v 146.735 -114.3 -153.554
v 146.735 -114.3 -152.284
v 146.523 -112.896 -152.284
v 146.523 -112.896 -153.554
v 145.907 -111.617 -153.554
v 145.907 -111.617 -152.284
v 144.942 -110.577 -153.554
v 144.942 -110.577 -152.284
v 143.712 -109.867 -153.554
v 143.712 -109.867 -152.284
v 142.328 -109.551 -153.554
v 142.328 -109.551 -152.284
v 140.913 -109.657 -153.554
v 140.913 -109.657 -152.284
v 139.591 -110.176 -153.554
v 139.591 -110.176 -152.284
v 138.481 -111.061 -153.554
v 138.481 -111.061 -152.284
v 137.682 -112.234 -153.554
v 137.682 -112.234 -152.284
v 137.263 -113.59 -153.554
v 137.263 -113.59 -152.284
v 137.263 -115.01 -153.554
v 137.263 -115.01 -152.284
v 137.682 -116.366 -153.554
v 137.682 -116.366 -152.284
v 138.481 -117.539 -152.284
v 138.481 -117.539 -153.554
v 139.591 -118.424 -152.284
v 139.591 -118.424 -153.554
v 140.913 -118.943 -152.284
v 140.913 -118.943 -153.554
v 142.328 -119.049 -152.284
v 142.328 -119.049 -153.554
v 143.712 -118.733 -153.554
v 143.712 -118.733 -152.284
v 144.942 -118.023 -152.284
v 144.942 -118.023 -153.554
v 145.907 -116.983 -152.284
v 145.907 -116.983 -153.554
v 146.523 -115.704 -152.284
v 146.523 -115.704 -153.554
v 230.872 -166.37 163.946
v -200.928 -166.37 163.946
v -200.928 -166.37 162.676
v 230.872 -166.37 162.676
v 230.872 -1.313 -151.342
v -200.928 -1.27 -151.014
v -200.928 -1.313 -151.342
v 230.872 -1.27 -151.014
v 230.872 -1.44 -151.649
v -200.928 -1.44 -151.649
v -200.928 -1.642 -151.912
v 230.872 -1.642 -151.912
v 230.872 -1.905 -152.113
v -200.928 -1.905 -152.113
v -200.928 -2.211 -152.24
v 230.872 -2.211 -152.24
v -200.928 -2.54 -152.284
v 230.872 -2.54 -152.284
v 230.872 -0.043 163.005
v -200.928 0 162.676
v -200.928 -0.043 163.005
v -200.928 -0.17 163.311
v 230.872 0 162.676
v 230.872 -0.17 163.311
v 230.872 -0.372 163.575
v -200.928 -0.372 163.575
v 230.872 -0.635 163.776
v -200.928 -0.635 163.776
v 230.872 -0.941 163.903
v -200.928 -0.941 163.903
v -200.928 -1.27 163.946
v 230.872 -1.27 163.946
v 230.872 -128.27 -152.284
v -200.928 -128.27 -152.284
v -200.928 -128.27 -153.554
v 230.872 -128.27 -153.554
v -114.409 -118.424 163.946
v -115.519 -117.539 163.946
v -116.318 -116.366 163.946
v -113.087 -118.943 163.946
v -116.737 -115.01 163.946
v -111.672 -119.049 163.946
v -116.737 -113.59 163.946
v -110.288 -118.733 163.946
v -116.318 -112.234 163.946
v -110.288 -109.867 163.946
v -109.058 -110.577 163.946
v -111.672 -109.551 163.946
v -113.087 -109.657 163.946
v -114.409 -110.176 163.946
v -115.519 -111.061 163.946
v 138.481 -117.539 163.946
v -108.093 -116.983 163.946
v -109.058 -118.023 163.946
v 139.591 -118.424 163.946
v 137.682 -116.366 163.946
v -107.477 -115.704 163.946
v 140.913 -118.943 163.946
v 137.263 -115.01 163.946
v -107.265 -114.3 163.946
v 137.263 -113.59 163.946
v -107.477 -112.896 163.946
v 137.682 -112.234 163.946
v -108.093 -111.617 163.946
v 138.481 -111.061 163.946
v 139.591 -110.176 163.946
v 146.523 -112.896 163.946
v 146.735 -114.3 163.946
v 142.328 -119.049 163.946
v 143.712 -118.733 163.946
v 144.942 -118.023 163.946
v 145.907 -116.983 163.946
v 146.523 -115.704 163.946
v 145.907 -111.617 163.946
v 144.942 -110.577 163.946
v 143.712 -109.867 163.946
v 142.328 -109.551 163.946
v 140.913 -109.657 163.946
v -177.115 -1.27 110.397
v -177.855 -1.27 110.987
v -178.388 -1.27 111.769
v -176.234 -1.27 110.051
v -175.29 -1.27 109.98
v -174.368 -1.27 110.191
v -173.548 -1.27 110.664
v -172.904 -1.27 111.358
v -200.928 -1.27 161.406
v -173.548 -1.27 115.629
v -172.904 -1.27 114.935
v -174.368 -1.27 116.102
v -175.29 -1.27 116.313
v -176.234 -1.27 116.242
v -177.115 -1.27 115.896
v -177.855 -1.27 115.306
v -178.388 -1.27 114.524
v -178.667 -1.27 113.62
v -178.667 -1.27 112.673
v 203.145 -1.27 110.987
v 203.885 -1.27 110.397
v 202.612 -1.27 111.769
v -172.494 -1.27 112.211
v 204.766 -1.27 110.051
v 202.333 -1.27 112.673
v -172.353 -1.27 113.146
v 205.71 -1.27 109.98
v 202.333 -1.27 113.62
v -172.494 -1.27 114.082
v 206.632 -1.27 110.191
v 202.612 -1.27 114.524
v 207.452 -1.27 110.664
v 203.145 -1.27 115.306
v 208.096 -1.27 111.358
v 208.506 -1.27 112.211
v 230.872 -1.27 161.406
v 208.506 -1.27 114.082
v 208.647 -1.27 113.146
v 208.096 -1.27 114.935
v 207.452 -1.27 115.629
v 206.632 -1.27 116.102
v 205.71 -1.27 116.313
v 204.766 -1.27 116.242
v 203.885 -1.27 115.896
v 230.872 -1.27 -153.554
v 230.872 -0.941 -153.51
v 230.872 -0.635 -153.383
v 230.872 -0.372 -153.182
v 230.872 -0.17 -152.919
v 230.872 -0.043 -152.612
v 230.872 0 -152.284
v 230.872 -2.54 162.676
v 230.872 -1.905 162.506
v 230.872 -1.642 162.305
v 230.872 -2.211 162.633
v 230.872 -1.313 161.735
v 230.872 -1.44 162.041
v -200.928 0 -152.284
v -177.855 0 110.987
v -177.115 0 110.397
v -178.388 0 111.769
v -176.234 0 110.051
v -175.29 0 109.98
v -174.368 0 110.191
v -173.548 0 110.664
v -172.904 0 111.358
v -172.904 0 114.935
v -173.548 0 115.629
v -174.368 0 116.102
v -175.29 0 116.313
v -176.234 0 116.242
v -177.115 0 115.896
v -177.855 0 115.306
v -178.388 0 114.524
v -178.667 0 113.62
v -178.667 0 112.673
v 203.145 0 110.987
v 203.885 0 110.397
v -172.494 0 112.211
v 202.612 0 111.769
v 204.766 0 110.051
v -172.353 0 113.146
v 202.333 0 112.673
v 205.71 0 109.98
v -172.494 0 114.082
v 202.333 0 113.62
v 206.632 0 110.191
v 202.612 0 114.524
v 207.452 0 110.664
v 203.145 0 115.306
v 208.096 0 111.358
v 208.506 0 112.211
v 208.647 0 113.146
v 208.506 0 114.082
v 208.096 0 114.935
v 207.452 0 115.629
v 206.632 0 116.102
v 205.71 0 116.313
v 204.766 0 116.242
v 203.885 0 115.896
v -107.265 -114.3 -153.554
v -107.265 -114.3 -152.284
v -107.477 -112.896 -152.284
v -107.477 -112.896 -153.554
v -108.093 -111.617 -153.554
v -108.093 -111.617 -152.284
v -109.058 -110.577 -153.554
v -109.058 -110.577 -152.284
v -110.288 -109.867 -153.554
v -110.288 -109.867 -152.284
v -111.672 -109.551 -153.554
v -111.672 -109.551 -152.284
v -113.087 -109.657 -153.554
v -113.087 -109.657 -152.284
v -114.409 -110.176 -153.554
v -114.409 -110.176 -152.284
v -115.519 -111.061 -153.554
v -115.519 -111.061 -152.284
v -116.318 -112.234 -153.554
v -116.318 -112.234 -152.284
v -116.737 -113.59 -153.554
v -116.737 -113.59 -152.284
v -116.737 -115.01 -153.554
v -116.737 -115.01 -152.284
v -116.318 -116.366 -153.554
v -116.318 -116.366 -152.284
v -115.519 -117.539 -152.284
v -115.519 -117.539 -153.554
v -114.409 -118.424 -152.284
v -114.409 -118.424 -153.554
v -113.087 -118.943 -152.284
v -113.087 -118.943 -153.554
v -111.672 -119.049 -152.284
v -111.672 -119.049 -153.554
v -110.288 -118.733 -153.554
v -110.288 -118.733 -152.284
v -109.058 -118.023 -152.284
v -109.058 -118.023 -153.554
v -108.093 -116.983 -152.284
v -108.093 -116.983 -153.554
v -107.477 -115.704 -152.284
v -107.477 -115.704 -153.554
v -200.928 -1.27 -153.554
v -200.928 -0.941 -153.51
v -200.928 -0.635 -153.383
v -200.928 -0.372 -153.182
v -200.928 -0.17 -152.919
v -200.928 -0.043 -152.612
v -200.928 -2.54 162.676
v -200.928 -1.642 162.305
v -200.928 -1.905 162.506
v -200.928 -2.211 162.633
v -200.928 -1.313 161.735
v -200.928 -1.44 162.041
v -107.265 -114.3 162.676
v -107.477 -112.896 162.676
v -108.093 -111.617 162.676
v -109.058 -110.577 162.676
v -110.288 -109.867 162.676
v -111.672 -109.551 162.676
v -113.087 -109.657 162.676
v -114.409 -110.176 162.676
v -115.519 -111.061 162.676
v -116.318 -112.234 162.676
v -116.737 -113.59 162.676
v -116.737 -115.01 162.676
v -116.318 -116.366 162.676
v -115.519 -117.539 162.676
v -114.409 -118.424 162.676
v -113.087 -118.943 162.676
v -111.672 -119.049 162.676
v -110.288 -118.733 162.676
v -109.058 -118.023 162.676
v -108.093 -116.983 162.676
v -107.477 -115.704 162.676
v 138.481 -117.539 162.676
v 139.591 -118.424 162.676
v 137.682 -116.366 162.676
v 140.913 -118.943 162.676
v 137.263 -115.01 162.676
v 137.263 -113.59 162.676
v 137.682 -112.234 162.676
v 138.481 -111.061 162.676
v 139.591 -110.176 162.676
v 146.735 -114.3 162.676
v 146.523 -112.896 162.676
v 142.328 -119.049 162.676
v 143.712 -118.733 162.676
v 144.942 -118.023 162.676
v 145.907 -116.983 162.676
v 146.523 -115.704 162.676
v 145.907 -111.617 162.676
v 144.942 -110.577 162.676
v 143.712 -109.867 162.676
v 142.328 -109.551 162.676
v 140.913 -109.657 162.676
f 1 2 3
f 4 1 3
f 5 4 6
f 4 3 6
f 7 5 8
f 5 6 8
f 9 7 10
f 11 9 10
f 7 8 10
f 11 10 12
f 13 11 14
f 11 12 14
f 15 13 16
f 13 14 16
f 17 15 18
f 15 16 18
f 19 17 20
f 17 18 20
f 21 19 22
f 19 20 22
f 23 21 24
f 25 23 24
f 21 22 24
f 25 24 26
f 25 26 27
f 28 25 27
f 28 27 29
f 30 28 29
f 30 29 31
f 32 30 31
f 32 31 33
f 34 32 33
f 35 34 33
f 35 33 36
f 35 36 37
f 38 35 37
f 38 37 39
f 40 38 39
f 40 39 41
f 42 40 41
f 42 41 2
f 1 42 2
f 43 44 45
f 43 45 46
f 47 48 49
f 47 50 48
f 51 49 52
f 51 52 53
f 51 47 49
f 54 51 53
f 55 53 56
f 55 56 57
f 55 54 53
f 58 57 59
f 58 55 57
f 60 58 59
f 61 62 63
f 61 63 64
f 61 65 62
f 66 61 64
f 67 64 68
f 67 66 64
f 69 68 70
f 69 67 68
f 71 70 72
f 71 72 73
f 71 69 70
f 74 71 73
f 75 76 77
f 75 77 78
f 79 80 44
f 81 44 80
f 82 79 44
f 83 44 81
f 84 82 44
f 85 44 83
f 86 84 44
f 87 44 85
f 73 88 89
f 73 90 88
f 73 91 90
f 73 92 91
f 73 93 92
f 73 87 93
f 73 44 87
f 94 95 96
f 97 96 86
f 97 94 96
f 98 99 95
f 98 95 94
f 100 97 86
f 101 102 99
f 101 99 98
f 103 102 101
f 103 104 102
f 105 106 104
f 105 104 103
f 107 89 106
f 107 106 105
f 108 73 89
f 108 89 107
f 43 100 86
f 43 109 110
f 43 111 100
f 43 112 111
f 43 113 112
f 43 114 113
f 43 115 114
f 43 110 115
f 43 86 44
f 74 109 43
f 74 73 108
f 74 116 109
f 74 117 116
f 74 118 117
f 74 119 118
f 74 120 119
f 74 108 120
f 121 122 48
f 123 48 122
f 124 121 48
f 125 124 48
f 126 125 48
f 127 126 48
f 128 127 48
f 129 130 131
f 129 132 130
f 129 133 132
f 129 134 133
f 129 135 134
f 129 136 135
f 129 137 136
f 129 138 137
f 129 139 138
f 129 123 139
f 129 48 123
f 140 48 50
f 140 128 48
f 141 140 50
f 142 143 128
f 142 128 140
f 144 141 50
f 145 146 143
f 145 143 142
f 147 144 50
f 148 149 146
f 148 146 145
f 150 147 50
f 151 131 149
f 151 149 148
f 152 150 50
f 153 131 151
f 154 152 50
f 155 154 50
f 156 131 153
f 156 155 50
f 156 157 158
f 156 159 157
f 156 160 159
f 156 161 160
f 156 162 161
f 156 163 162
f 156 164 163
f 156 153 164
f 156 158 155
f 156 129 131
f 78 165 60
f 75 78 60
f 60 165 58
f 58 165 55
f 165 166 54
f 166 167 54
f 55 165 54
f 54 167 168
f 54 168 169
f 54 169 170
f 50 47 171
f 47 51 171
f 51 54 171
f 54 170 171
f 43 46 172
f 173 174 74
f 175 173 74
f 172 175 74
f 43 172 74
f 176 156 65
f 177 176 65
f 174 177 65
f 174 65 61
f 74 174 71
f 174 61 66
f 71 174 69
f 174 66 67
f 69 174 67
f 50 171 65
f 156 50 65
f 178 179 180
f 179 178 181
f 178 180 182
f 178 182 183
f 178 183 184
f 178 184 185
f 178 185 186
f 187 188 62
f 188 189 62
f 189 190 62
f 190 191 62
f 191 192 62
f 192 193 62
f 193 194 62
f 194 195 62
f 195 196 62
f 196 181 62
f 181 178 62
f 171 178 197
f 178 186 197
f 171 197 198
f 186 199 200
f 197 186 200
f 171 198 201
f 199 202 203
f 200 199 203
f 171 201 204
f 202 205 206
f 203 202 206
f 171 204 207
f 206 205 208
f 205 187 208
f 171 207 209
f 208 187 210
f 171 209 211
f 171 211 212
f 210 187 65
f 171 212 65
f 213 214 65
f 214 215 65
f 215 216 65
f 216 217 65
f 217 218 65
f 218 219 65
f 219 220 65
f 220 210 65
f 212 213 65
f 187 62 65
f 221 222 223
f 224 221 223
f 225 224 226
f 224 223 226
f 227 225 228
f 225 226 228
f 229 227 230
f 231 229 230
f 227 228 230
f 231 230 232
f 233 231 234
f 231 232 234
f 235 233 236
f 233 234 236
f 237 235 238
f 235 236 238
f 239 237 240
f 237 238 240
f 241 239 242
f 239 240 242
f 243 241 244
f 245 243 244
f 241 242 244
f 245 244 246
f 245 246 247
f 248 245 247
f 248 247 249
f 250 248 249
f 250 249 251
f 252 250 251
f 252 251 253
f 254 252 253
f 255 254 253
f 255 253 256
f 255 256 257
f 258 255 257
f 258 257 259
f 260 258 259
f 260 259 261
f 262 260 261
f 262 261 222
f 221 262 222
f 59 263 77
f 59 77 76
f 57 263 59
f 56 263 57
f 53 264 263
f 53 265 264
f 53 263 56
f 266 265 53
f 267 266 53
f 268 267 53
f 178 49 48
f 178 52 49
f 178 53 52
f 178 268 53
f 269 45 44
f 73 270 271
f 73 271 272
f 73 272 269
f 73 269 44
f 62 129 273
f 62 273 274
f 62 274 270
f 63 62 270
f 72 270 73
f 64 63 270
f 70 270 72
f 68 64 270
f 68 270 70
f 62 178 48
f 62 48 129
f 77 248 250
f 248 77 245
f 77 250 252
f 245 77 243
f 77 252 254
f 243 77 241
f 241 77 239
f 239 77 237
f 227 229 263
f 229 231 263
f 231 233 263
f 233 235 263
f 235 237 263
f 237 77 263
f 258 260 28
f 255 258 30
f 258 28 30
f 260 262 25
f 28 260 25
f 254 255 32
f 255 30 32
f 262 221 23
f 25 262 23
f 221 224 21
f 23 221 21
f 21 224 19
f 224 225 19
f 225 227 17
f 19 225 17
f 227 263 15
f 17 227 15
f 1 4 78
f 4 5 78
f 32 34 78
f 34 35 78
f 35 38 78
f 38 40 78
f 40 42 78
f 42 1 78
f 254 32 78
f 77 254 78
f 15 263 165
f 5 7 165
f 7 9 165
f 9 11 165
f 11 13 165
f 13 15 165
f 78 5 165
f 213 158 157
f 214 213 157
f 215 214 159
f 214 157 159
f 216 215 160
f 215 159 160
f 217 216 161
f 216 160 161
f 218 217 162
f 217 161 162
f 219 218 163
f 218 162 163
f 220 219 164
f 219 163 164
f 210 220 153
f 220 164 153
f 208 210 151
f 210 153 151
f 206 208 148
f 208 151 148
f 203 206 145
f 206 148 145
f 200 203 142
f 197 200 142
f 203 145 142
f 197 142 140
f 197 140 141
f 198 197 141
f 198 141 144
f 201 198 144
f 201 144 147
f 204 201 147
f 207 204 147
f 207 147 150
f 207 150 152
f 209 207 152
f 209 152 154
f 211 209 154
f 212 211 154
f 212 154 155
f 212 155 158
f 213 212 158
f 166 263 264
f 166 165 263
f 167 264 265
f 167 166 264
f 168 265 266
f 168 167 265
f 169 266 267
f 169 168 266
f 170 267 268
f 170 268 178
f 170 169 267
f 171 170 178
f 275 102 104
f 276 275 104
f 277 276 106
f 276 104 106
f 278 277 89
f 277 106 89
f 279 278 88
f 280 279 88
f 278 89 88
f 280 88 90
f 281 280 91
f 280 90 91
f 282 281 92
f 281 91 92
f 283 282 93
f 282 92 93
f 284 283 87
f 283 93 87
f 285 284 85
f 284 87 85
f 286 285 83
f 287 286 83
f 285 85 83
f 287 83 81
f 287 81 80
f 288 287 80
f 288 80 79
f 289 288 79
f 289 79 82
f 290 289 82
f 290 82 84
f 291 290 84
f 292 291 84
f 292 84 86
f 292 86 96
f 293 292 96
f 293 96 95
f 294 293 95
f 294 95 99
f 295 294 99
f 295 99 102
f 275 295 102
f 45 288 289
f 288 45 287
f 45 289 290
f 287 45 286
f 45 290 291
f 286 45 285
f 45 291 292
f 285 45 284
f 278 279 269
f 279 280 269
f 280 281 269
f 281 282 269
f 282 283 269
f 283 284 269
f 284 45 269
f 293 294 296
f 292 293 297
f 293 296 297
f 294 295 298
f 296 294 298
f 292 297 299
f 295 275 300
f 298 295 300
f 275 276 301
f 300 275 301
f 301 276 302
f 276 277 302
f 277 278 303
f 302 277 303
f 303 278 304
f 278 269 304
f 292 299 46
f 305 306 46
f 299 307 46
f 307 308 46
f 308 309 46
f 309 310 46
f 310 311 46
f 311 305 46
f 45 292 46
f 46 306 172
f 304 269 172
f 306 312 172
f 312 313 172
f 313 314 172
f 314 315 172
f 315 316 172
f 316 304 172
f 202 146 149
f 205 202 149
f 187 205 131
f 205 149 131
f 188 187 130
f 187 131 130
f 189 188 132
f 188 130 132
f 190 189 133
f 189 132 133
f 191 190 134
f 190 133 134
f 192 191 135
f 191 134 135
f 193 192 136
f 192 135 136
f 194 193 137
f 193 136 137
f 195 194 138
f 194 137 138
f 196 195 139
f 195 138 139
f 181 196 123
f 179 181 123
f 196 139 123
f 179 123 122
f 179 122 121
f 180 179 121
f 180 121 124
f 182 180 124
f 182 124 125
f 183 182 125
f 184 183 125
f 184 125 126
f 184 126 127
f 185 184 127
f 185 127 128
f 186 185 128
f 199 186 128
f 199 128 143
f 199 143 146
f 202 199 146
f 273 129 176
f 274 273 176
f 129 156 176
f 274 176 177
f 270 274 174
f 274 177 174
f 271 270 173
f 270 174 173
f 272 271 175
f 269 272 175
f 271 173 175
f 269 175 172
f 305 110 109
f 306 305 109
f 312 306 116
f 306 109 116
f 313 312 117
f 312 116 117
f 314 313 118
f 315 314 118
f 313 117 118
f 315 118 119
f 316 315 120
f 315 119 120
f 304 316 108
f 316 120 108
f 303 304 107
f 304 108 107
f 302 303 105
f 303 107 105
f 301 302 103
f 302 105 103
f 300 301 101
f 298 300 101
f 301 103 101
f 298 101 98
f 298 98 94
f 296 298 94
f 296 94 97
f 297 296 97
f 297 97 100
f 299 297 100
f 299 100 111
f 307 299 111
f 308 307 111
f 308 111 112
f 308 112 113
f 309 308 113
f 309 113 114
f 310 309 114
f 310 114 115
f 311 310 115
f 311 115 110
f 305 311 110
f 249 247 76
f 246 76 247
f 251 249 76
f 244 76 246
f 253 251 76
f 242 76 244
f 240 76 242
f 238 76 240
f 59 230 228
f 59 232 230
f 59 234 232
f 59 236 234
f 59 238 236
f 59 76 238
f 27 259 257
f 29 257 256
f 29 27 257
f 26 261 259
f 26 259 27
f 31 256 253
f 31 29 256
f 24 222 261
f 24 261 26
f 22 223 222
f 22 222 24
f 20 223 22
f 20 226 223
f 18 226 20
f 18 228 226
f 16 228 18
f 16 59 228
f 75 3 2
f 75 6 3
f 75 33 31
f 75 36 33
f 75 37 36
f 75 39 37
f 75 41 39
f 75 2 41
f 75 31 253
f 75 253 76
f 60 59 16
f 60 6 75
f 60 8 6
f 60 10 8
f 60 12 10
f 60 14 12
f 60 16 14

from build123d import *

# Parameters (mm, degrees)
F0_W      = 431.8
F0_H      = 317.5
F1_DEPTH  = 1.27
F2_W      = 431.8
F2_H      = 1.27
F3_DEPTH  = 165.1
F4_R      = 1.27
F5_W      = 431.8
F5_H      = 1.27
F6_DEPTH  = 127
F7_R      = 1.27
F8_R      = 3.175
F9_DEPTH  = 25.4
F10_R     = 4.7625
F11_DEPTH = 317.501


with BuildPart() as f1:
    # F0 (on Front) → F1 (new body)
    with BuildSketch(Plane.XZ):
        with Locations((14.972474, 5.196487)):
            Rectangle(F0_W, F0_H)
    extrude(amount=F1_DEPTH)

    # F2 (on face) → F3 (join)
    with BuildSketch(Plane.XZ.offset(1.27)):
        with Locations((14.972474, 163.311487)):
            Rectangle(F2_W, F2_H)
    extrude(amount=F3_DEPTH)

    # F4
    f4_edges = [f1.edges().sort_by_distance(p)[0] for p in [
        (14.972474, -1.27, 162.676487),
        (14.972474, 0, 163.946487),
    ]]
    fillet(f4_edges, radius=F4_R)

    # F5 (on face) → F6 (join)
    with BuildSketch(Plane.XZ.offset(1.27)):
        with Locations((14.972474, -152.918513)):
            Rectangle(F5_W, F5_H)
    extrude(amount=F6_DEPTH)

    # F7
    f7_edges = [f1.edges().sort_by_distance(p)[0] for p in [
        (14.972474, -1.27, -152.283513),
        (14.972474, 0, -153.553513),
    ]]
    fillet(f7_edges, radius=F7_R)

    # F8 (on face) → F9 (cut)
    with BuildSketch(Plane.XZ.offset(1.27)):
        with Locations((-175.527526, 113.146487)):
            Circle(F8_R)
        with Locations((205.472474, 113.146487)):
            Circle(F8_R)
    extrude(amount=-F9_DEPTH, mode=Mode.SUBTRACT)

    # F10 (on face) → F11 (cut, through all)
    with BuildSketch(Plane.XY.offset(163.946487)):
        with Locations((-112.027526, -114.3)):
            Circle(F10_R)
        with Locations((141.972474, -114.3)):
            Circle(F10_R)
    extrude(amount=-F11_DEPTH, mode=Mode.SUBTRACT)


solid = f1.part
